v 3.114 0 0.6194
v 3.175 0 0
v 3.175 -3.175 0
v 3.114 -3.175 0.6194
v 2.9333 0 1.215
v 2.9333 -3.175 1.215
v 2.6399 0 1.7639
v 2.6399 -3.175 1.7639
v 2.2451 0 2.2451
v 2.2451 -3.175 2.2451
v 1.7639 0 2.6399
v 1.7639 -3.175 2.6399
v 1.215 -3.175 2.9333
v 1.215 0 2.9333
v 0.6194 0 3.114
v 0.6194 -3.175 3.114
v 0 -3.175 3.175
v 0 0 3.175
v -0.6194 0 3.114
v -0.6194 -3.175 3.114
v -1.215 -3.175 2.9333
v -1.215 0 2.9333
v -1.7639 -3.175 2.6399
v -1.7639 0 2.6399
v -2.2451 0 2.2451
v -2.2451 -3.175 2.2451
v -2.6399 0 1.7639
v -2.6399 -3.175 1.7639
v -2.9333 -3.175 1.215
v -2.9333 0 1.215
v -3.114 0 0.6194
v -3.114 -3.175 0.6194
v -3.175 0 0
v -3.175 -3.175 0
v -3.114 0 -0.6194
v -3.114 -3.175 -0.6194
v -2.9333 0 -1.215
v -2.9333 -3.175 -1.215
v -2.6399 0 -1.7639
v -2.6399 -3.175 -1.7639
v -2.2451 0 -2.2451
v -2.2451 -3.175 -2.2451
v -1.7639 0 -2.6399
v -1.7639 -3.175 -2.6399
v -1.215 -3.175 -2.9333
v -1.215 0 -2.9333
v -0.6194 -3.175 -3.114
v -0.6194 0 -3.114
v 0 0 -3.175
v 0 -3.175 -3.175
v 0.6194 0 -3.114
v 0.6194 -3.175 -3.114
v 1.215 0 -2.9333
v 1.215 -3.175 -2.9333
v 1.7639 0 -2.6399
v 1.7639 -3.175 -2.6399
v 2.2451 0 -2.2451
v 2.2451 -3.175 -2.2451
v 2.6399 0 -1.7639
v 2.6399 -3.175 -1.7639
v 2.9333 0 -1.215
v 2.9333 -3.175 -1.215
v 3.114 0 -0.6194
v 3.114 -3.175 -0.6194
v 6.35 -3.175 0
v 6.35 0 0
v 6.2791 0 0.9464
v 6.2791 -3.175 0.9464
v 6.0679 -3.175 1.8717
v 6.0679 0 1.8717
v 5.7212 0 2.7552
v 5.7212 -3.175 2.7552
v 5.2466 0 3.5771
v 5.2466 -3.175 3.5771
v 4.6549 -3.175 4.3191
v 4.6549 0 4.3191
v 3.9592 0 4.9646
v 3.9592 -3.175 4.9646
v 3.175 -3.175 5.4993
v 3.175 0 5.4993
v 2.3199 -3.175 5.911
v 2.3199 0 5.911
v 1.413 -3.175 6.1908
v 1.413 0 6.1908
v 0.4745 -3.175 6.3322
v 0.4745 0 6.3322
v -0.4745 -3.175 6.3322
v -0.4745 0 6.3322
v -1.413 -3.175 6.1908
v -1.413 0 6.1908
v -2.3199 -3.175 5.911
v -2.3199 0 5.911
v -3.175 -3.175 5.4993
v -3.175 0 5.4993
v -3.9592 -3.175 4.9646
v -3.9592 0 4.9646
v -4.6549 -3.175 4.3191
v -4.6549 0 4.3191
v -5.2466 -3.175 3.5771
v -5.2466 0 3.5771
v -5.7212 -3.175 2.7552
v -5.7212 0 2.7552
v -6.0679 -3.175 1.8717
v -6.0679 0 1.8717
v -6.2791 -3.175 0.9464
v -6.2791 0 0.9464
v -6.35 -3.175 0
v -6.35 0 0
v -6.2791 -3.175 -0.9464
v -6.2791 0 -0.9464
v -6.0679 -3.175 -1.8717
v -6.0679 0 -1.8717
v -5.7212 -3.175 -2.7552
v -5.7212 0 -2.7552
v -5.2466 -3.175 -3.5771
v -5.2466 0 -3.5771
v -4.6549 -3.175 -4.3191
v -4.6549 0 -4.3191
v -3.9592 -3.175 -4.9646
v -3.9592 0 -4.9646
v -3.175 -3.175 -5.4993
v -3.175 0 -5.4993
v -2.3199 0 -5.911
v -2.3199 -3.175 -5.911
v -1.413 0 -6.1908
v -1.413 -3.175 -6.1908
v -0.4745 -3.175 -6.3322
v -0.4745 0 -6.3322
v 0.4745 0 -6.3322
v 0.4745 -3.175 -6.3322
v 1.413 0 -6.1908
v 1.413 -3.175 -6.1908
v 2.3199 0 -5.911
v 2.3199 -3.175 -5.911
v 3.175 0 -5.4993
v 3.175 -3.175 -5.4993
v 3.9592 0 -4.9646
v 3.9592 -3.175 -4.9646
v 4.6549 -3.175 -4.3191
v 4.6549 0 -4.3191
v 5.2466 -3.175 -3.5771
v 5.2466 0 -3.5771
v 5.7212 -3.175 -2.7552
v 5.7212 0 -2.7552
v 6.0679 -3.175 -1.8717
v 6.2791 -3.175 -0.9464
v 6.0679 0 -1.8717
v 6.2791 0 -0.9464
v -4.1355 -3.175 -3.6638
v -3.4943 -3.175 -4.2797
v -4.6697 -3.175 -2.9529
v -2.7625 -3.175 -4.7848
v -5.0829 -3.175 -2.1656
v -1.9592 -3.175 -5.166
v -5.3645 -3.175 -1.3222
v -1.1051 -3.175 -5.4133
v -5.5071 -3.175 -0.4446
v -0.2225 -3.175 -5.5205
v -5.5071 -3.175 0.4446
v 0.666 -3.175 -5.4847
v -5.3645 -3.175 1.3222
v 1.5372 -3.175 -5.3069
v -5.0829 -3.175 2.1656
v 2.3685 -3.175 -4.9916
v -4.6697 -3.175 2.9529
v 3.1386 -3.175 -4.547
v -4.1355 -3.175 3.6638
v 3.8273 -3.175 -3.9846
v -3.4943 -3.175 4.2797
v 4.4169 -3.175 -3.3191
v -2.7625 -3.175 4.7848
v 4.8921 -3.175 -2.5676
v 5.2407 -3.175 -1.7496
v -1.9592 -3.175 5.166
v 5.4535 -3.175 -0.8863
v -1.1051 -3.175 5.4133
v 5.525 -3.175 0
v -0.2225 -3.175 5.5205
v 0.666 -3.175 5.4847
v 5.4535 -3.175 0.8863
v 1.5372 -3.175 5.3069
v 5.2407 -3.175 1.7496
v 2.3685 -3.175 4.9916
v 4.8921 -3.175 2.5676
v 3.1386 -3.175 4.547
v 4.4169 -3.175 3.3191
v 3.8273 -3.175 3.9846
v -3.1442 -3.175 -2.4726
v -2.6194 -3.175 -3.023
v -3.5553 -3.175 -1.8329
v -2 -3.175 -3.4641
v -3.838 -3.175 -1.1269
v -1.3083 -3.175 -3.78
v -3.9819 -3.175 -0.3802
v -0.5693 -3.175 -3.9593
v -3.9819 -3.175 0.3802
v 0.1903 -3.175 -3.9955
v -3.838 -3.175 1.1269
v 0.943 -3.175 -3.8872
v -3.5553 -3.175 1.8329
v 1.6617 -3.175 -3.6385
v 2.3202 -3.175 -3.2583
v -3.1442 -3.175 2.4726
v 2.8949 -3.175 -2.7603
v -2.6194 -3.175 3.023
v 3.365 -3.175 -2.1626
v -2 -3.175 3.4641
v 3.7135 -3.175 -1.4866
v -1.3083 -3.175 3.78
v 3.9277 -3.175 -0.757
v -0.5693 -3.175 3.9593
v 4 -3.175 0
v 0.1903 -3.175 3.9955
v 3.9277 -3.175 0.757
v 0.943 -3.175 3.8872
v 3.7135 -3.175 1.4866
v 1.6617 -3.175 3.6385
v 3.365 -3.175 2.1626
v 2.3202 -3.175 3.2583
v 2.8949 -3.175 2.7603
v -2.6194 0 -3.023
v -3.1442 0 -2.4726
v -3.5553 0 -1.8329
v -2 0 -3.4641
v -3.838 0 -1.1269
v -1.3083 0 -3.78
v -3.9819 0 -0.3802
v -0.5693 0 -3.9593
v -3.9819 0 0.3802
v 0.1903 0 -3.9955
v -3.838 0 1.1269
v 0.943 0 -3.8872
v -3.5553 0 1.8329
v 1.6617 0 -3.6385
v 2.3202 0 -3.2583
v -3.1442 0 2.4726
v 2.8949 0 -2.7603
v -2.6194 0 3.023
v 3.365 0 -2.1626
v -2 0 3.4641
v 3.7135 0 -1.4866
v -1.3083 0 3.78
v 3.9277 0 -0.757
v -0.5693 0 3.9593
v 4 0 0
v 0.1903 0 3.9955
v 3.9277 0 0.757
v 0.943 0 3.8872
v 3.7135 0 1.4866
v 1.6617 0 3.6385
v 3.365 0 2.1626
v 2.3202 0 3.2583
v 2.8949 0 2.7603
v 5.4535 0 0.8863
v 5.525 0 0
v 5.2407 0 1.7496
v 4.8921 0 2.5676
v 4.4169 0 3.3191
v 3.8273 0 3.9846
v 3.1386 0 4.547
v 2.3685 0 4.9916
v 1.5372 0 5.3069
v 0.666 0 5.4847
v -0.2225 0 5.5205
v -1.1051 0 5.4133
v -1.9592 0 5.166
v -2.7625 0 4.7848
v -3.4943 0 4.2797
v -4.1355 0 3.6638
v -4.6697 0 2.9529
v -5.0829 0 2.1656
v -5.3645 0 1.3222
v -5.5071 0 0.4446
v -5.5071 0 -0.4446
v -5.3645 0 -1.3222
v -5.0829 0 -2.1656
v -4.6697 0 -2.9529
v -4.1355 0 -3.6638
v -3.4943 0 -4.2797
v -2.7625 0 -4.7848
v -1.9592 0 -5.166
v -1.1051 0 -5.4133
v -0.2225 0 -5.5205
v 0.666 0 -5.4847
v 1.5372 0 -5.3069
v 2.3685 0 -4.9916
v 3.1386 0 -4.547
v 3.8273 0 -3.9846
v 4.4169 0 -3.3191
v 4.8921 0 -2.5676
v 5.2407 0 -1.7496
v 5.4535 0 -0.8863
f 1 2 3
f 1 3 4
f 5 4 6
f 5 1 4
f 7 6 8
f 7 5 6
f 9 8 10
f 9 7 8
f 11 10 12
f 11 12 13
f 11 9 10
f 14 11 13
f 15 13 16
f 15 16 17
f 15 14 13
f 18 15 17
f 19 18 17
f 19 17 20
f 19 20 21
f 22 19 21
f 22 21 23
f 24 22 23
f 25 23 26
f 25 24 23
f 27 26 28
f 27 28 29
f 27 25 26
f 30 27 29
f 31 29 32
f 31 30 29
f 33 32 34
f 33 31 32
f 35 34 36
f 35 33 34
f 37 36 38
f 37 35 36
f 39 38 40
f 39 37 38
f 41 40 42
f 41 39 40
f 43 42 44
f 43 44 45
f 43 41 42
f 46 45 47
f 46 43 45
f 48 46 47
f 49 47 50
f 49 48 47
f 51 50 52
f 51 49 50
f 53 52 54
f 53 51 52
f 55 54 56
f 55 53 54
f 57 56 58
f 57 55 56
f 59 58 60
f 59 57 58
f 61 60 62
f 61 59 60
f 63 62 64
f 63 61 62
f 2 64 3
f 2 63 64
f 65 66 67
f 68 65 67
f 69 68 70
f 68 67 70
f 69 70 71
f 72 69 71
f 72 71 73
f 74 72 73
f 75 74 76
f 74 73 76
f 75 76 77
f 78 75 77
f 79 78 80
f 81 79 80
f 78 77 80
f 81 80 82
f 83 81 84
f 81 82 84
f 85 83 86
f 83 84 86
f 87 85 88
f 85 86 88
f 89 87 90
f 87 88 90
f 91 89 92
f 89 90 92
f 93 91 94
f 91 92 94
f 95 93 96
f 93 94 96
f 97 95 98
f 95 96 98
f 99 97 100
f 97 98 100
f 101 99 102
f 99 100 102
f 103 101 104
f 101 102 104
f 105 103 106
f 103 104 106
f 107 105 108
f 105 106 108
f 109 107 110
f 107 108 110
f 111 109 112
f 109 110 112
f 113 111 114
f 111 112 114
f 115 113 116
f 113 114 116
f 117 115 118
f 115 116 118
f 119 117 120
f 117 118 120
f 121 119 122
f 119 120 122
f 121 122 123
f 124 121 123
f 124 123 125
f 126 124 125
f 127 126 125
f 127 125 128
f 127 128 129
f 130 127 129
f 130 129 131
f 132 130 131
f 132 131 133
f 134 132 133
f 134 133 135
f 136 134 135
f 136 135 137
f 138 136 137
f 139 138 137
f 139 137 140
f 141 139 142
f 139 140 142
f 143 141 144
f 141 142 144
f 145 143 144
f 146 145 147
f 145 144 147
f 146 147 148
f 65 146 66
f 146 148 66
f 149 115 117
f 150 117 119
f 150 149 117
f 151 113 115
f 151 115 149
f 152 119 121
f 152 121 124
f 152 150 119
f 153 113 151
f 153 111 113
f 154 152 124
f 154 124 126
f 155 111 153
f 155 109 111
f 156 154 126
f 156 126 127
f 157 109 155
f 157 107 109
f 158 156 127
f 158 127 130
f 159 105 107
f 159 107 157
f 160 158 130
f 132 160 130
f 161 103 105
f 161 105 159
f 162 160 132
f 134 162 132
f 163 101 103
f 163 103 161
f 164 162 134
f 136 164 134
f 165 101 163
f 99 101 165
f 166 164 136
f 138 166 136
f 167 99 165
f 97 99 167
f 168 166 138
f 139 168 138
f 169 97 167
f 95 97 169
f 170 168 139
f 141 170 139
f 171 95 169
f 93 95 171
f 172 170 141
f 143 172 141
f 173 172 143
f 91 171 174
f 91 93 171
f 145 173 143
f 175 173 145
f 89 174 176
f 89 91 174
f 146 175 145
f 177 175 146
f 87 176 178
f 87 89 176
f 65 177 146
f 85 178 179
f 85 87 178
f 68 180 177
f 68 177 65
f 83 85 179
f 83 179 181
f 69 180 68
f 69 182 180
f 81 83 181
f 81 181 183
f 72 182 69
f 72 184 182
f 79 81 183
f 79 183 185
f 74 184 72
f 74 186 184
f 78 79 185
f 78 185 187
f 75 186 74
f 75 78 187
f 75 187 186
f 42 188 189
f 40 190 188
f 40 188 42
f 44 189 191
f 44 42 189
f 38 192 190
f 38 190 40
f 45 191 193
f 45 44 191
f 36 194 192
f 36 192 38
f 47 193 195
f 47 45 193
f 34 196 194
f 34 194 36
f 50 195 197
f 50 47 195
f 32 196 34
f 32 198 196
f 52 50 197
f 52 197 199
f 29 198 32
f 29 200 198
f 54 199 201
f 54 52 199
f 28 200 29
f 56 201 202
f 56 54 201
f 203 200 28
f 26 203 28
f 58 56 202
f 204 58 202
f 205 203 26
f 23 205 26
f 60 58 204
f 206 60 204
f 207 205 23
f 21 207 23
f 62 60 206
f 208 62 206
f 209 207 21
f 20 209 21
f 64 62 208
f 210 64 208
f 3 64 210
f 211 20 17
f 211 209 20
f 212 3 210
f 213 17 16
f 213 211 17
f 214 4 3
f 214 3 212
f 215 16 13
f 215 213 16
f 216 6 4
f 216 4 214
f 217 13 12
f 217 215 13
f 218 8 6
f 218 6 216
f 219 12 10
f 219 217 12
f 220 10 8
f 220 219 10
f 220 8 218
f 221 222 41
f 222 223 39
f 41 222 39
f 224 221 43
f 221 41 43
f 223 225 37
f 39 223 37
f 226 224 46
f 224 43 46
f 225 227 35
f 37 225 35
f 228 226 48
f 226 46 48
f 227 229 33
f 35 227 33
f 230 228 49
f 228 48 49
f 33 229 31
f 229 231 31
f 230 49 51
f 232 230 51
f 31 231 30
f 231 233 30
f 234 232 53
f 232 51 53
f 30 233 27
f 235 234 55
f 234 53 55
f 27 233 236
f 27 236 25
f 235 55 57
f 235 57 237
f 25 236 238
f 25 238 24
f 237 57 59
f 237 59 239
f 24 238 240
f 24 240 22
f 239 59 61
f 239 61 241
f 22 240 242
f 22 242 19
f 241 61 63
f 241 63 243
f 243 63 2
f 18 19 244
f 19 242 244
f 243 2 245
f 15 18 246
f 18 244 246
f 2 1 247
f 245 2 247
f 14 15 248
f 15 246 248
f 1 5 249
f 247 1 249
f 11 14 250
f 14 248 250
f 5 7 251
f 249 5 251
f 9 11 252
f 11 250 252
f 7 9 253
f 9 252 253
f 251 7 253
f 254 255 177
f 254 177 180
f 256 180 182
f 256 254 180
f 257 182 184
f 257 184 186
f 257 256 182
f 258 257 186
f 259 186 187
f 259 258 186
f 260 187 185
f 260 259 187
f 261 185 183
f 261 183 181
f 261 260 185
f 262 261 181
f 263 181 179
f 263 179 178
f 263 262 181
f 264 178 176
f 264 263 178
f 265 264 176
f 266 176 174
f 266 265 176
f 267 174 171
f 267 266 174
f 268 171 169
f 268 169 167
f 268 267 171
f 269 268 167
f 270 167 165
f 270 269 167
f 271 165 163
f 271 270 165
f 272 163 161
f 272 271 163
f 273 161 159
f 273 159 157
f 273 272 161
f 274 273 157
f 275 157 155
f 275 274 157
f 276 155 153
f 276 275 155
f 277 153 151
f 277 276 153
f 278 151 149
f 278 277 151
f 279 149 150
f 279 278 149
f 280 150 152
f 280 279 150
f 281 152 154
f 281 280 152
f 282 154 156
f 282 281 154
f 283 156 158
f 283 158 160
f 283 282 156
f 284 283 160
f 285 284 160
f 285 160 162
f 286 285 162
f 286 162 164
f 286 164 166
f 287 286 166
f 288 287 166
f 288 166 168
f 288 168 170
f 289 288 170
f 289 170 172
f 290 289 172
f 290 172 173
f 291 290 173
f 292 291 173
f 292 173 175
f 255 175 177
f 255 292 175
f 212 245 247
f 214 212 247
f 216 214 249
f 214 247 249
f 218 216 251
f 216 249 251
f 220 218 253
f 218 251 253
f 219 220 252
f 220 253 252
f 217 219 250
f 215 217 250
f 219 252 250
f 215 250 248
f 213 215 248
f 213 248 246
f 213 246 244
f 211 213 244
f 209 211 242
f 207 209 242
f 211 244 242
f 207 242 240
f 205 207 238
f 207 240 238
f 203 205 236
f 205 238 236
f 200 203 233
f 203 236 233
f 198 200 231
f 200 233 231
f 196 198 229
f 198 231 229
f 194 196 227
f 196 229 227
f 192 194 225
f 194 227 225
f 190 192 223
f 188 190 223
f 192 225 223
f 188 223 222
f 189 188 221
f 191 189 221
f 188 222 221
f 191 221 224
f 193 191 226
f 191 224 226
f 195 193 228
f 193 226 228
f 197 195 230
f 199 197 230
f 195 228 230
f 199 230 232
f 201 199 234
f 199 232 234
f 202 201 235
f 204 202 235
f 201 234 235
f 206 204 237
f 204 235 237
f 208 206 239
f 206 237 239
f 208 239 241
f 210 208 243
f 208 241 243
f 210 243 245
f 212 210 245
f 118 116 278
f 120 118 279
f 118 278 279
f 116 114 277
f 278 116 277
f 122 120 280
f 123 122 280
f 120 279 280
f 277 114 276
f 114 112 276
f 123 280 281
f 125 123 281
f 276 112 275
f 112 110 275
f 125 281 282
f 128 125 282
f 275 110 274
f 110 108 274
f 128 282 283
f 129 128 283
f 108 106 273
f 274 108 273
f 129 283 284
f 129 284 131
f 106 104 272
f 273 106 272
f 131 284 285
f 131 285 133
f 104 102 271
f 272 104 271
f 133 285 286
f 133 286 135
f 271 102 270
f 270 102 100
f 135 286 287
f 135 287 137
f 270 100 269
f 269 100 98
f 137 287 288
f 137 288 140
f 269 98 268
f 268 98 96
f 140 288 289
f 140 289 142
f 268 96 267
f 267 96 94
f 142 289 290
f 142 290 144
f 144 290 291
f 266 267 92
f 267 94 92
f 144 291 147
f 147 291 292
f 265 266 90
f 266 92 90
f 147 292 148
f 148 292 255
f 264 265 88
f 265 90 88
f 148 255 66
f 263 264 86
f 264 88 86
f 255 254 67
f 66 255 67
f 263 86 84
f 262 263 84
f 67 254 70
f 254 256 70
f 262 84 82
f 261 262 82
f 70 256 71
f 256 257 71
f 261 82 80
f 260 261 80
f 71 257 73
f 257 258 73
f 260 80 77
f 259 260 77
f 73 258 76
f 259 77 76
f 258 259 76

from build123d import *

# Parameters (mm, degrees)
F0_R     = 6.35
F0_R_2   = 5.525
F0_R_3   = 4
F0_R_4   = 3.175
F1_DEPTH = 3.175


with BuildPart() as f1:
    # F0 (on Front) → F1 (new body)
    with BuildSketch(Plane.XZ):
        Circle(F0_R)
        Circle(F0_R_2, mode=Mode.SUBTRACT)
        Circle(F0_R_3)
        Circle(F0_R_4, mode=Mode.SUBTRACT)
    extrude(amount=F1_DEPTH)


solid = f1.part
